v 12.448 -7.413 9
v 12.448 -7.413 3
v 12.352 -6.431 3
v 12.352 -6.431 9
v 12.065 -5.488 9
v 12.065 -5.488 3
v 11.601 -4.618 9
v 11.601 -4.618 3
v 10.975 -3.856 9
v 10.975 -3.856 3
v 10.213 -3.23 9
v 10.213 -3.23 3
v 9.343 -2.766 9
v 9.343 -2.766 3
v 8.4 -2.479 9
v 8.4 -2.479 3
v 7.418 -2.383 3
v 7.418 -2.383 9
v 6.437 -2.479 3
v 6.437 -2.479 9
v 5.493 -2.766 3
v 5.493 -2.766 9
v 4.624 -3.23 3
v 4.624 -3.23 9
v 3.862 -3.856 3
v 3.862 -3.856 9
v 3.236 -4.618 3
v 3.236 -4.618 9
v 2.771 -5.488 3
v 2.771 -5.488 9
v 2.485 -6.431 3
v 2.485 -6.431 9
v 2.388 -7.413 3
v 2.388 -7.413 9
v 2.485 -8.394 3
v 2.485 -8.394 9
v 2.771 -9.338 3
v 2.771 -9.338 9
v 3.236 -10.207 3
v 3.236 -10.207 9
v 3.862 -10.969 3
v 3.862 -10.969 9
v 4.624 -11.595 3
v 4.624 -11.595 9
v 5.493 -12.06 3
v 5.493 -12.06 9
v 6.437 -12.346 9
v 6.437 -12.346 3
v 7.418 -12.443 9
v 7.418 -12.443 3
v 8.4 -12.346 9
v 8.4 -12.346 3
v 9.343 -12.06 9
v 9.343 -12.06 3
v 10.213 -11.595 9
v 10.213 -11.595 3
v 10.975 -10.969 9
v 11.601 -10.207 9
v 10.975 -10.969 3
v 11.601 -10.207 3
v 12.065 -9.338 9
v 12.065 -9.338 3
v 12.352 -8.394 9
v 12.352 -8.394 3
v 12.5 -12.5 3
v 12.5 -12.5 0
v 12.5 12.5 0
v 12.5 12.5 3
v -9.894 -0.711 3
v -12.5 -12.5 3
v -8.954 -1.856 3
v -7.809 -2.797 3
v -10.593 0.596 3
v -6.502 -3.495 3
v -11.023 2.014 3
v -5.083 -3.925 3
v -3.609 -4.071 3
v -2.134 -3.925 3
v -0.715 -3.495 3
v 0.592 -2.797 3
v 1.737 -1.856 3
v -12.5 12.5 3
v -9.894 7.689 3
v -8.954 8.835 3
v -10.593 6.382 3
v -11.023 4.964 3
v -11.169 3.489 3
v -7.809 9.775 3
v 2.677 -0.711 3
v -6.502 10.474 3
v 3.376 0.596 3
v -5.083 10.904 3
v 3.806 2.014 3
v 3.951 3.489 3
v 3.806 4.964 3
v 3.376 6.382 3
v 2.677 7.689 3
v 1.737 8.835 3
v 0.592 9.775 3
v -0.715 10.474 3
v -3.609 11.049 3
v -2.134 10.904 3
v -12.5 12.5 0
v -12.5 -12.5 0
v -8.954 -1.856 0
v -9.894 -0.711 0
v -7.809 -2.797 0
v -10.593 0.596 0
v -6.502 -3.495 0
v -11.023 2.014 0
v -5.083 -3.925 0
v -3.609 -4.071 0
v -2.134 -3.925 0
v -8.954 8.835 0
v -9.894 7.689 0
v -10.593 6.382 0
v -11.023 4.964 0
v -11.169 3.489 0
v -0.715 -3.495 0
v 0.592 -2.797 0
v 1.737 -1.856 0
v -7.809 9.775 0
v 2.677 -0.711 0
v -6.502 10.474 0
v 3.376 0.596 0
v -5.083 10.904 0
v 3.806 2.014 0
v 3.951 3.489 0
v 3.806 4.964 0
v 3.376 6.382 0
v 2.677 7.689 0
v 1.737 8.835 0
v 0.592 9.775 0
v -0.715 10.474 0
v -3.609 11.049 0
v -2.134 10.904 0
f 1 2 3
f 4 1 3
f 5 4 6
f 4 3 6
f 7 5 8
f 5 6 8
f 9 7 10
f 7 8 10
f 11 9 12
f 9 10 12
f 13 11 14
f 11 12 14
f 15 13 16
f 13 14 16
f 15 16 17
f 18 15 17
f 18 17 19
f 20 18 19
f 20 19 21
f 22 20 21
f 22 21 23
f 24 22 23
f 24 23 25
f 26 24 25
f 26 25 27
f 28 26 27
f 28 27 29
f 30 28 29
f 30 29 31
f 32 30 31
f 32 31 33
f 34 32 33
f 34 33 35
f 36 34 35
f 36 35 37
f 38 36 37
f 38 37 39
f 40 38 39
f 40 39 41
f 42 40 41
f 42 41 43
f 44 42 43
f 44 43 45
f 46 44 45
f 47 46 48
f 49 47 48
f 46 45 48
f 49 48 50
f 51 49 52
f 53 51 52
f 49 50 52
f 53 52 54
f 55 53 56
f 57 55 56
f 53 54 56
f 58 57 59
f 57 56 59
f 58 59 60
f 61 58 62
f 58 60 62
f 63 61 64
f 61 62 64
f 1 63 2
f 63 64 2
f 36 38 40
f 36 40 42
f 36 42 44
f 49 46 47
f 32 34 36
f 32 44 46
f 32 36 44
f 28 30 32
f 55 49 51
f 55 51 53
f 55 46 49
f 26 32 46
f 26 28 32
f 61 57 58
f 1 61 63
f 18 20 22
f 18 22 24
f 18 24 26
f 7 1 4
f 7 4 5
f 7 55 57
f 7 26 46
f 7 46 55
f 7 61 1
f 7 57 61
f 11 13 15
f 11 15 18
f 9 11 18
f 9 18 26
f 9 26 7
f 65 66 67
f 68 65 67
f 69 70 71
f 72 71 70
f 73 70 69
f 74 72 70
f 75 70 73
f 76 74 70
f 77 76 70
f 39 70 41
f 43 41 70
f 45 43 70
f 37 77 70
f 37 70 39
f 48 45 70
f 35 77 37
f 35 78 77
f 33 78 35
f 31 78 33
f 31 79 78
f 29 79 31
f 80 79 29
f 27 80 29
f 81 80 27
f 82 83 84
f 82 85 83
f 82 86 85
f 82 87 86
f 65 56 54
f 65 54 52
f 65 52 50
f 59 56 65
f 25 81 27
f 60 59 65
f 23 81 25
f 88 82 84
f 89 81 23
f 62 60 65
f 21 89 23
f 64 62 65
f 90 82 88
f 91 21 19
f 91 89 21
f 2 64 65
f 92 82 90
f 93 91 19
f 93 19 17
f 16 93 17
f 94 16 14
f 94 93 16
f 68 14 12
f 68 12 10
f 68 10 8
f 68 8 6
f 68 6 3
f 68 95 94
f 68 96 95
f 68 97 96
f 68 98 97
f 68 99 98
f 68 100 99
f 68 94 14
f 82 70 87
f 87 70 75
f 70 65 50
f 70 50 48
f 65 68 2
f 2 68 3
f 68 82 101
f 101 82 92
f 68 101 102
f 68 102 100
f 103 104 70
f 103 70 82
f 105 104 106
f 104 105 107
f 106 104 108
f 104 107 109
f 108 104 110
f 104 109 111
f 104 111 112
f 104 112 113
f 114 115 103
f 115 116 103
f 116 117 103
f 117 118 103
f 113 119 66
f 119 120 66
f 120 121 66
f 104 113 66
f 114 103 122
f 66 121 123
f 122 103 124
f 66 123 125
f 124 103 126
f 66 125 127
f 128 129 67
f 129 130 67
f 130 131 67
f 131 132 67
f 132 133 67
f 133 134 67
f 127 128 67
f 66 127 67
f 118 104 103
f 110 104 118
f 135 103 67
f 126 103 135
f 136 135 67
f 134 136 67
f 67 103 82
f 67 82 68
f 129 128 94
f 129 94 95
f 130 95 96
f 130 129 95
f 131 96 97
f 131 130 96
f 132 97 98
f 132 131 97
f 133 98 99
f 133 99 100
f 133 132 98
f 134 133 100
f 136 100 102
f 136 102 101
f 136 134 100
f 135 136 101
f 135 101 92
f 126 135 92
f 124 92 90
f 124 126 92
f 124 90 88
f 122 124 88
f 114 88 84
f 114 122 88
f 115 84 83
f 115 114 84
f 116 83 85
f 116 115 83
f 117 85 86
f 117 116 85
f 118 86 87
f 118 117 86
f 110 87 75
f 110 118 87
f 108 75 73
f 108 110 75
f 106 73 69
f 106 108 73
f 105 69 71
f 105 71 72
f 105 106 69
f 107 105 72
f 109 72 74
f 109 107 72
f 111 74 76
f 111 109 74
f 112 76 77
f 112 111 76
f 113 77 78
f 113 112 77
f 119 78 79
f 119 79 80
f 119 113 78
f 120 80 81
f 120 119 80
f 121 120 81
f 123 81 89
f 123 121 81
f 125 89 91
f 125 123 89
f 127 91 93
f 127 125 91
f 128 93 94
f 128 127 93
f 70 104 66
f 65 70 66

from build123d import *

# Parameters (mm, degrees)
SKETCH_W     = 25
SKETCH_H     = 25
SKETCH_R     = 7.56
PAD_DEPTH    = 3
SKETCH001_R  = 5.03
PAD001_DEPTH = 9


with BuildPart() as part:
    # Sketch → Pad (new body)
    with BuildSketch(Plane.XY):
        Rectangle(SKETCH_W, SKETCH_H)
        with Locations((-3.608525, 3.489298)):
            Circle(SKETCH_R, mode=Mode.SUBTRACT)
    extrude(amount=PAD_DEPTH)

    # Sketch001 → Pad001 (join)
    with BuildSketch(Plane.XY):
        with Locations((7.418324, -7.412742)):
            Circle(SKETCH001_R)
    extrude(amount=PAD001_DEPTH)


solid = part.part
